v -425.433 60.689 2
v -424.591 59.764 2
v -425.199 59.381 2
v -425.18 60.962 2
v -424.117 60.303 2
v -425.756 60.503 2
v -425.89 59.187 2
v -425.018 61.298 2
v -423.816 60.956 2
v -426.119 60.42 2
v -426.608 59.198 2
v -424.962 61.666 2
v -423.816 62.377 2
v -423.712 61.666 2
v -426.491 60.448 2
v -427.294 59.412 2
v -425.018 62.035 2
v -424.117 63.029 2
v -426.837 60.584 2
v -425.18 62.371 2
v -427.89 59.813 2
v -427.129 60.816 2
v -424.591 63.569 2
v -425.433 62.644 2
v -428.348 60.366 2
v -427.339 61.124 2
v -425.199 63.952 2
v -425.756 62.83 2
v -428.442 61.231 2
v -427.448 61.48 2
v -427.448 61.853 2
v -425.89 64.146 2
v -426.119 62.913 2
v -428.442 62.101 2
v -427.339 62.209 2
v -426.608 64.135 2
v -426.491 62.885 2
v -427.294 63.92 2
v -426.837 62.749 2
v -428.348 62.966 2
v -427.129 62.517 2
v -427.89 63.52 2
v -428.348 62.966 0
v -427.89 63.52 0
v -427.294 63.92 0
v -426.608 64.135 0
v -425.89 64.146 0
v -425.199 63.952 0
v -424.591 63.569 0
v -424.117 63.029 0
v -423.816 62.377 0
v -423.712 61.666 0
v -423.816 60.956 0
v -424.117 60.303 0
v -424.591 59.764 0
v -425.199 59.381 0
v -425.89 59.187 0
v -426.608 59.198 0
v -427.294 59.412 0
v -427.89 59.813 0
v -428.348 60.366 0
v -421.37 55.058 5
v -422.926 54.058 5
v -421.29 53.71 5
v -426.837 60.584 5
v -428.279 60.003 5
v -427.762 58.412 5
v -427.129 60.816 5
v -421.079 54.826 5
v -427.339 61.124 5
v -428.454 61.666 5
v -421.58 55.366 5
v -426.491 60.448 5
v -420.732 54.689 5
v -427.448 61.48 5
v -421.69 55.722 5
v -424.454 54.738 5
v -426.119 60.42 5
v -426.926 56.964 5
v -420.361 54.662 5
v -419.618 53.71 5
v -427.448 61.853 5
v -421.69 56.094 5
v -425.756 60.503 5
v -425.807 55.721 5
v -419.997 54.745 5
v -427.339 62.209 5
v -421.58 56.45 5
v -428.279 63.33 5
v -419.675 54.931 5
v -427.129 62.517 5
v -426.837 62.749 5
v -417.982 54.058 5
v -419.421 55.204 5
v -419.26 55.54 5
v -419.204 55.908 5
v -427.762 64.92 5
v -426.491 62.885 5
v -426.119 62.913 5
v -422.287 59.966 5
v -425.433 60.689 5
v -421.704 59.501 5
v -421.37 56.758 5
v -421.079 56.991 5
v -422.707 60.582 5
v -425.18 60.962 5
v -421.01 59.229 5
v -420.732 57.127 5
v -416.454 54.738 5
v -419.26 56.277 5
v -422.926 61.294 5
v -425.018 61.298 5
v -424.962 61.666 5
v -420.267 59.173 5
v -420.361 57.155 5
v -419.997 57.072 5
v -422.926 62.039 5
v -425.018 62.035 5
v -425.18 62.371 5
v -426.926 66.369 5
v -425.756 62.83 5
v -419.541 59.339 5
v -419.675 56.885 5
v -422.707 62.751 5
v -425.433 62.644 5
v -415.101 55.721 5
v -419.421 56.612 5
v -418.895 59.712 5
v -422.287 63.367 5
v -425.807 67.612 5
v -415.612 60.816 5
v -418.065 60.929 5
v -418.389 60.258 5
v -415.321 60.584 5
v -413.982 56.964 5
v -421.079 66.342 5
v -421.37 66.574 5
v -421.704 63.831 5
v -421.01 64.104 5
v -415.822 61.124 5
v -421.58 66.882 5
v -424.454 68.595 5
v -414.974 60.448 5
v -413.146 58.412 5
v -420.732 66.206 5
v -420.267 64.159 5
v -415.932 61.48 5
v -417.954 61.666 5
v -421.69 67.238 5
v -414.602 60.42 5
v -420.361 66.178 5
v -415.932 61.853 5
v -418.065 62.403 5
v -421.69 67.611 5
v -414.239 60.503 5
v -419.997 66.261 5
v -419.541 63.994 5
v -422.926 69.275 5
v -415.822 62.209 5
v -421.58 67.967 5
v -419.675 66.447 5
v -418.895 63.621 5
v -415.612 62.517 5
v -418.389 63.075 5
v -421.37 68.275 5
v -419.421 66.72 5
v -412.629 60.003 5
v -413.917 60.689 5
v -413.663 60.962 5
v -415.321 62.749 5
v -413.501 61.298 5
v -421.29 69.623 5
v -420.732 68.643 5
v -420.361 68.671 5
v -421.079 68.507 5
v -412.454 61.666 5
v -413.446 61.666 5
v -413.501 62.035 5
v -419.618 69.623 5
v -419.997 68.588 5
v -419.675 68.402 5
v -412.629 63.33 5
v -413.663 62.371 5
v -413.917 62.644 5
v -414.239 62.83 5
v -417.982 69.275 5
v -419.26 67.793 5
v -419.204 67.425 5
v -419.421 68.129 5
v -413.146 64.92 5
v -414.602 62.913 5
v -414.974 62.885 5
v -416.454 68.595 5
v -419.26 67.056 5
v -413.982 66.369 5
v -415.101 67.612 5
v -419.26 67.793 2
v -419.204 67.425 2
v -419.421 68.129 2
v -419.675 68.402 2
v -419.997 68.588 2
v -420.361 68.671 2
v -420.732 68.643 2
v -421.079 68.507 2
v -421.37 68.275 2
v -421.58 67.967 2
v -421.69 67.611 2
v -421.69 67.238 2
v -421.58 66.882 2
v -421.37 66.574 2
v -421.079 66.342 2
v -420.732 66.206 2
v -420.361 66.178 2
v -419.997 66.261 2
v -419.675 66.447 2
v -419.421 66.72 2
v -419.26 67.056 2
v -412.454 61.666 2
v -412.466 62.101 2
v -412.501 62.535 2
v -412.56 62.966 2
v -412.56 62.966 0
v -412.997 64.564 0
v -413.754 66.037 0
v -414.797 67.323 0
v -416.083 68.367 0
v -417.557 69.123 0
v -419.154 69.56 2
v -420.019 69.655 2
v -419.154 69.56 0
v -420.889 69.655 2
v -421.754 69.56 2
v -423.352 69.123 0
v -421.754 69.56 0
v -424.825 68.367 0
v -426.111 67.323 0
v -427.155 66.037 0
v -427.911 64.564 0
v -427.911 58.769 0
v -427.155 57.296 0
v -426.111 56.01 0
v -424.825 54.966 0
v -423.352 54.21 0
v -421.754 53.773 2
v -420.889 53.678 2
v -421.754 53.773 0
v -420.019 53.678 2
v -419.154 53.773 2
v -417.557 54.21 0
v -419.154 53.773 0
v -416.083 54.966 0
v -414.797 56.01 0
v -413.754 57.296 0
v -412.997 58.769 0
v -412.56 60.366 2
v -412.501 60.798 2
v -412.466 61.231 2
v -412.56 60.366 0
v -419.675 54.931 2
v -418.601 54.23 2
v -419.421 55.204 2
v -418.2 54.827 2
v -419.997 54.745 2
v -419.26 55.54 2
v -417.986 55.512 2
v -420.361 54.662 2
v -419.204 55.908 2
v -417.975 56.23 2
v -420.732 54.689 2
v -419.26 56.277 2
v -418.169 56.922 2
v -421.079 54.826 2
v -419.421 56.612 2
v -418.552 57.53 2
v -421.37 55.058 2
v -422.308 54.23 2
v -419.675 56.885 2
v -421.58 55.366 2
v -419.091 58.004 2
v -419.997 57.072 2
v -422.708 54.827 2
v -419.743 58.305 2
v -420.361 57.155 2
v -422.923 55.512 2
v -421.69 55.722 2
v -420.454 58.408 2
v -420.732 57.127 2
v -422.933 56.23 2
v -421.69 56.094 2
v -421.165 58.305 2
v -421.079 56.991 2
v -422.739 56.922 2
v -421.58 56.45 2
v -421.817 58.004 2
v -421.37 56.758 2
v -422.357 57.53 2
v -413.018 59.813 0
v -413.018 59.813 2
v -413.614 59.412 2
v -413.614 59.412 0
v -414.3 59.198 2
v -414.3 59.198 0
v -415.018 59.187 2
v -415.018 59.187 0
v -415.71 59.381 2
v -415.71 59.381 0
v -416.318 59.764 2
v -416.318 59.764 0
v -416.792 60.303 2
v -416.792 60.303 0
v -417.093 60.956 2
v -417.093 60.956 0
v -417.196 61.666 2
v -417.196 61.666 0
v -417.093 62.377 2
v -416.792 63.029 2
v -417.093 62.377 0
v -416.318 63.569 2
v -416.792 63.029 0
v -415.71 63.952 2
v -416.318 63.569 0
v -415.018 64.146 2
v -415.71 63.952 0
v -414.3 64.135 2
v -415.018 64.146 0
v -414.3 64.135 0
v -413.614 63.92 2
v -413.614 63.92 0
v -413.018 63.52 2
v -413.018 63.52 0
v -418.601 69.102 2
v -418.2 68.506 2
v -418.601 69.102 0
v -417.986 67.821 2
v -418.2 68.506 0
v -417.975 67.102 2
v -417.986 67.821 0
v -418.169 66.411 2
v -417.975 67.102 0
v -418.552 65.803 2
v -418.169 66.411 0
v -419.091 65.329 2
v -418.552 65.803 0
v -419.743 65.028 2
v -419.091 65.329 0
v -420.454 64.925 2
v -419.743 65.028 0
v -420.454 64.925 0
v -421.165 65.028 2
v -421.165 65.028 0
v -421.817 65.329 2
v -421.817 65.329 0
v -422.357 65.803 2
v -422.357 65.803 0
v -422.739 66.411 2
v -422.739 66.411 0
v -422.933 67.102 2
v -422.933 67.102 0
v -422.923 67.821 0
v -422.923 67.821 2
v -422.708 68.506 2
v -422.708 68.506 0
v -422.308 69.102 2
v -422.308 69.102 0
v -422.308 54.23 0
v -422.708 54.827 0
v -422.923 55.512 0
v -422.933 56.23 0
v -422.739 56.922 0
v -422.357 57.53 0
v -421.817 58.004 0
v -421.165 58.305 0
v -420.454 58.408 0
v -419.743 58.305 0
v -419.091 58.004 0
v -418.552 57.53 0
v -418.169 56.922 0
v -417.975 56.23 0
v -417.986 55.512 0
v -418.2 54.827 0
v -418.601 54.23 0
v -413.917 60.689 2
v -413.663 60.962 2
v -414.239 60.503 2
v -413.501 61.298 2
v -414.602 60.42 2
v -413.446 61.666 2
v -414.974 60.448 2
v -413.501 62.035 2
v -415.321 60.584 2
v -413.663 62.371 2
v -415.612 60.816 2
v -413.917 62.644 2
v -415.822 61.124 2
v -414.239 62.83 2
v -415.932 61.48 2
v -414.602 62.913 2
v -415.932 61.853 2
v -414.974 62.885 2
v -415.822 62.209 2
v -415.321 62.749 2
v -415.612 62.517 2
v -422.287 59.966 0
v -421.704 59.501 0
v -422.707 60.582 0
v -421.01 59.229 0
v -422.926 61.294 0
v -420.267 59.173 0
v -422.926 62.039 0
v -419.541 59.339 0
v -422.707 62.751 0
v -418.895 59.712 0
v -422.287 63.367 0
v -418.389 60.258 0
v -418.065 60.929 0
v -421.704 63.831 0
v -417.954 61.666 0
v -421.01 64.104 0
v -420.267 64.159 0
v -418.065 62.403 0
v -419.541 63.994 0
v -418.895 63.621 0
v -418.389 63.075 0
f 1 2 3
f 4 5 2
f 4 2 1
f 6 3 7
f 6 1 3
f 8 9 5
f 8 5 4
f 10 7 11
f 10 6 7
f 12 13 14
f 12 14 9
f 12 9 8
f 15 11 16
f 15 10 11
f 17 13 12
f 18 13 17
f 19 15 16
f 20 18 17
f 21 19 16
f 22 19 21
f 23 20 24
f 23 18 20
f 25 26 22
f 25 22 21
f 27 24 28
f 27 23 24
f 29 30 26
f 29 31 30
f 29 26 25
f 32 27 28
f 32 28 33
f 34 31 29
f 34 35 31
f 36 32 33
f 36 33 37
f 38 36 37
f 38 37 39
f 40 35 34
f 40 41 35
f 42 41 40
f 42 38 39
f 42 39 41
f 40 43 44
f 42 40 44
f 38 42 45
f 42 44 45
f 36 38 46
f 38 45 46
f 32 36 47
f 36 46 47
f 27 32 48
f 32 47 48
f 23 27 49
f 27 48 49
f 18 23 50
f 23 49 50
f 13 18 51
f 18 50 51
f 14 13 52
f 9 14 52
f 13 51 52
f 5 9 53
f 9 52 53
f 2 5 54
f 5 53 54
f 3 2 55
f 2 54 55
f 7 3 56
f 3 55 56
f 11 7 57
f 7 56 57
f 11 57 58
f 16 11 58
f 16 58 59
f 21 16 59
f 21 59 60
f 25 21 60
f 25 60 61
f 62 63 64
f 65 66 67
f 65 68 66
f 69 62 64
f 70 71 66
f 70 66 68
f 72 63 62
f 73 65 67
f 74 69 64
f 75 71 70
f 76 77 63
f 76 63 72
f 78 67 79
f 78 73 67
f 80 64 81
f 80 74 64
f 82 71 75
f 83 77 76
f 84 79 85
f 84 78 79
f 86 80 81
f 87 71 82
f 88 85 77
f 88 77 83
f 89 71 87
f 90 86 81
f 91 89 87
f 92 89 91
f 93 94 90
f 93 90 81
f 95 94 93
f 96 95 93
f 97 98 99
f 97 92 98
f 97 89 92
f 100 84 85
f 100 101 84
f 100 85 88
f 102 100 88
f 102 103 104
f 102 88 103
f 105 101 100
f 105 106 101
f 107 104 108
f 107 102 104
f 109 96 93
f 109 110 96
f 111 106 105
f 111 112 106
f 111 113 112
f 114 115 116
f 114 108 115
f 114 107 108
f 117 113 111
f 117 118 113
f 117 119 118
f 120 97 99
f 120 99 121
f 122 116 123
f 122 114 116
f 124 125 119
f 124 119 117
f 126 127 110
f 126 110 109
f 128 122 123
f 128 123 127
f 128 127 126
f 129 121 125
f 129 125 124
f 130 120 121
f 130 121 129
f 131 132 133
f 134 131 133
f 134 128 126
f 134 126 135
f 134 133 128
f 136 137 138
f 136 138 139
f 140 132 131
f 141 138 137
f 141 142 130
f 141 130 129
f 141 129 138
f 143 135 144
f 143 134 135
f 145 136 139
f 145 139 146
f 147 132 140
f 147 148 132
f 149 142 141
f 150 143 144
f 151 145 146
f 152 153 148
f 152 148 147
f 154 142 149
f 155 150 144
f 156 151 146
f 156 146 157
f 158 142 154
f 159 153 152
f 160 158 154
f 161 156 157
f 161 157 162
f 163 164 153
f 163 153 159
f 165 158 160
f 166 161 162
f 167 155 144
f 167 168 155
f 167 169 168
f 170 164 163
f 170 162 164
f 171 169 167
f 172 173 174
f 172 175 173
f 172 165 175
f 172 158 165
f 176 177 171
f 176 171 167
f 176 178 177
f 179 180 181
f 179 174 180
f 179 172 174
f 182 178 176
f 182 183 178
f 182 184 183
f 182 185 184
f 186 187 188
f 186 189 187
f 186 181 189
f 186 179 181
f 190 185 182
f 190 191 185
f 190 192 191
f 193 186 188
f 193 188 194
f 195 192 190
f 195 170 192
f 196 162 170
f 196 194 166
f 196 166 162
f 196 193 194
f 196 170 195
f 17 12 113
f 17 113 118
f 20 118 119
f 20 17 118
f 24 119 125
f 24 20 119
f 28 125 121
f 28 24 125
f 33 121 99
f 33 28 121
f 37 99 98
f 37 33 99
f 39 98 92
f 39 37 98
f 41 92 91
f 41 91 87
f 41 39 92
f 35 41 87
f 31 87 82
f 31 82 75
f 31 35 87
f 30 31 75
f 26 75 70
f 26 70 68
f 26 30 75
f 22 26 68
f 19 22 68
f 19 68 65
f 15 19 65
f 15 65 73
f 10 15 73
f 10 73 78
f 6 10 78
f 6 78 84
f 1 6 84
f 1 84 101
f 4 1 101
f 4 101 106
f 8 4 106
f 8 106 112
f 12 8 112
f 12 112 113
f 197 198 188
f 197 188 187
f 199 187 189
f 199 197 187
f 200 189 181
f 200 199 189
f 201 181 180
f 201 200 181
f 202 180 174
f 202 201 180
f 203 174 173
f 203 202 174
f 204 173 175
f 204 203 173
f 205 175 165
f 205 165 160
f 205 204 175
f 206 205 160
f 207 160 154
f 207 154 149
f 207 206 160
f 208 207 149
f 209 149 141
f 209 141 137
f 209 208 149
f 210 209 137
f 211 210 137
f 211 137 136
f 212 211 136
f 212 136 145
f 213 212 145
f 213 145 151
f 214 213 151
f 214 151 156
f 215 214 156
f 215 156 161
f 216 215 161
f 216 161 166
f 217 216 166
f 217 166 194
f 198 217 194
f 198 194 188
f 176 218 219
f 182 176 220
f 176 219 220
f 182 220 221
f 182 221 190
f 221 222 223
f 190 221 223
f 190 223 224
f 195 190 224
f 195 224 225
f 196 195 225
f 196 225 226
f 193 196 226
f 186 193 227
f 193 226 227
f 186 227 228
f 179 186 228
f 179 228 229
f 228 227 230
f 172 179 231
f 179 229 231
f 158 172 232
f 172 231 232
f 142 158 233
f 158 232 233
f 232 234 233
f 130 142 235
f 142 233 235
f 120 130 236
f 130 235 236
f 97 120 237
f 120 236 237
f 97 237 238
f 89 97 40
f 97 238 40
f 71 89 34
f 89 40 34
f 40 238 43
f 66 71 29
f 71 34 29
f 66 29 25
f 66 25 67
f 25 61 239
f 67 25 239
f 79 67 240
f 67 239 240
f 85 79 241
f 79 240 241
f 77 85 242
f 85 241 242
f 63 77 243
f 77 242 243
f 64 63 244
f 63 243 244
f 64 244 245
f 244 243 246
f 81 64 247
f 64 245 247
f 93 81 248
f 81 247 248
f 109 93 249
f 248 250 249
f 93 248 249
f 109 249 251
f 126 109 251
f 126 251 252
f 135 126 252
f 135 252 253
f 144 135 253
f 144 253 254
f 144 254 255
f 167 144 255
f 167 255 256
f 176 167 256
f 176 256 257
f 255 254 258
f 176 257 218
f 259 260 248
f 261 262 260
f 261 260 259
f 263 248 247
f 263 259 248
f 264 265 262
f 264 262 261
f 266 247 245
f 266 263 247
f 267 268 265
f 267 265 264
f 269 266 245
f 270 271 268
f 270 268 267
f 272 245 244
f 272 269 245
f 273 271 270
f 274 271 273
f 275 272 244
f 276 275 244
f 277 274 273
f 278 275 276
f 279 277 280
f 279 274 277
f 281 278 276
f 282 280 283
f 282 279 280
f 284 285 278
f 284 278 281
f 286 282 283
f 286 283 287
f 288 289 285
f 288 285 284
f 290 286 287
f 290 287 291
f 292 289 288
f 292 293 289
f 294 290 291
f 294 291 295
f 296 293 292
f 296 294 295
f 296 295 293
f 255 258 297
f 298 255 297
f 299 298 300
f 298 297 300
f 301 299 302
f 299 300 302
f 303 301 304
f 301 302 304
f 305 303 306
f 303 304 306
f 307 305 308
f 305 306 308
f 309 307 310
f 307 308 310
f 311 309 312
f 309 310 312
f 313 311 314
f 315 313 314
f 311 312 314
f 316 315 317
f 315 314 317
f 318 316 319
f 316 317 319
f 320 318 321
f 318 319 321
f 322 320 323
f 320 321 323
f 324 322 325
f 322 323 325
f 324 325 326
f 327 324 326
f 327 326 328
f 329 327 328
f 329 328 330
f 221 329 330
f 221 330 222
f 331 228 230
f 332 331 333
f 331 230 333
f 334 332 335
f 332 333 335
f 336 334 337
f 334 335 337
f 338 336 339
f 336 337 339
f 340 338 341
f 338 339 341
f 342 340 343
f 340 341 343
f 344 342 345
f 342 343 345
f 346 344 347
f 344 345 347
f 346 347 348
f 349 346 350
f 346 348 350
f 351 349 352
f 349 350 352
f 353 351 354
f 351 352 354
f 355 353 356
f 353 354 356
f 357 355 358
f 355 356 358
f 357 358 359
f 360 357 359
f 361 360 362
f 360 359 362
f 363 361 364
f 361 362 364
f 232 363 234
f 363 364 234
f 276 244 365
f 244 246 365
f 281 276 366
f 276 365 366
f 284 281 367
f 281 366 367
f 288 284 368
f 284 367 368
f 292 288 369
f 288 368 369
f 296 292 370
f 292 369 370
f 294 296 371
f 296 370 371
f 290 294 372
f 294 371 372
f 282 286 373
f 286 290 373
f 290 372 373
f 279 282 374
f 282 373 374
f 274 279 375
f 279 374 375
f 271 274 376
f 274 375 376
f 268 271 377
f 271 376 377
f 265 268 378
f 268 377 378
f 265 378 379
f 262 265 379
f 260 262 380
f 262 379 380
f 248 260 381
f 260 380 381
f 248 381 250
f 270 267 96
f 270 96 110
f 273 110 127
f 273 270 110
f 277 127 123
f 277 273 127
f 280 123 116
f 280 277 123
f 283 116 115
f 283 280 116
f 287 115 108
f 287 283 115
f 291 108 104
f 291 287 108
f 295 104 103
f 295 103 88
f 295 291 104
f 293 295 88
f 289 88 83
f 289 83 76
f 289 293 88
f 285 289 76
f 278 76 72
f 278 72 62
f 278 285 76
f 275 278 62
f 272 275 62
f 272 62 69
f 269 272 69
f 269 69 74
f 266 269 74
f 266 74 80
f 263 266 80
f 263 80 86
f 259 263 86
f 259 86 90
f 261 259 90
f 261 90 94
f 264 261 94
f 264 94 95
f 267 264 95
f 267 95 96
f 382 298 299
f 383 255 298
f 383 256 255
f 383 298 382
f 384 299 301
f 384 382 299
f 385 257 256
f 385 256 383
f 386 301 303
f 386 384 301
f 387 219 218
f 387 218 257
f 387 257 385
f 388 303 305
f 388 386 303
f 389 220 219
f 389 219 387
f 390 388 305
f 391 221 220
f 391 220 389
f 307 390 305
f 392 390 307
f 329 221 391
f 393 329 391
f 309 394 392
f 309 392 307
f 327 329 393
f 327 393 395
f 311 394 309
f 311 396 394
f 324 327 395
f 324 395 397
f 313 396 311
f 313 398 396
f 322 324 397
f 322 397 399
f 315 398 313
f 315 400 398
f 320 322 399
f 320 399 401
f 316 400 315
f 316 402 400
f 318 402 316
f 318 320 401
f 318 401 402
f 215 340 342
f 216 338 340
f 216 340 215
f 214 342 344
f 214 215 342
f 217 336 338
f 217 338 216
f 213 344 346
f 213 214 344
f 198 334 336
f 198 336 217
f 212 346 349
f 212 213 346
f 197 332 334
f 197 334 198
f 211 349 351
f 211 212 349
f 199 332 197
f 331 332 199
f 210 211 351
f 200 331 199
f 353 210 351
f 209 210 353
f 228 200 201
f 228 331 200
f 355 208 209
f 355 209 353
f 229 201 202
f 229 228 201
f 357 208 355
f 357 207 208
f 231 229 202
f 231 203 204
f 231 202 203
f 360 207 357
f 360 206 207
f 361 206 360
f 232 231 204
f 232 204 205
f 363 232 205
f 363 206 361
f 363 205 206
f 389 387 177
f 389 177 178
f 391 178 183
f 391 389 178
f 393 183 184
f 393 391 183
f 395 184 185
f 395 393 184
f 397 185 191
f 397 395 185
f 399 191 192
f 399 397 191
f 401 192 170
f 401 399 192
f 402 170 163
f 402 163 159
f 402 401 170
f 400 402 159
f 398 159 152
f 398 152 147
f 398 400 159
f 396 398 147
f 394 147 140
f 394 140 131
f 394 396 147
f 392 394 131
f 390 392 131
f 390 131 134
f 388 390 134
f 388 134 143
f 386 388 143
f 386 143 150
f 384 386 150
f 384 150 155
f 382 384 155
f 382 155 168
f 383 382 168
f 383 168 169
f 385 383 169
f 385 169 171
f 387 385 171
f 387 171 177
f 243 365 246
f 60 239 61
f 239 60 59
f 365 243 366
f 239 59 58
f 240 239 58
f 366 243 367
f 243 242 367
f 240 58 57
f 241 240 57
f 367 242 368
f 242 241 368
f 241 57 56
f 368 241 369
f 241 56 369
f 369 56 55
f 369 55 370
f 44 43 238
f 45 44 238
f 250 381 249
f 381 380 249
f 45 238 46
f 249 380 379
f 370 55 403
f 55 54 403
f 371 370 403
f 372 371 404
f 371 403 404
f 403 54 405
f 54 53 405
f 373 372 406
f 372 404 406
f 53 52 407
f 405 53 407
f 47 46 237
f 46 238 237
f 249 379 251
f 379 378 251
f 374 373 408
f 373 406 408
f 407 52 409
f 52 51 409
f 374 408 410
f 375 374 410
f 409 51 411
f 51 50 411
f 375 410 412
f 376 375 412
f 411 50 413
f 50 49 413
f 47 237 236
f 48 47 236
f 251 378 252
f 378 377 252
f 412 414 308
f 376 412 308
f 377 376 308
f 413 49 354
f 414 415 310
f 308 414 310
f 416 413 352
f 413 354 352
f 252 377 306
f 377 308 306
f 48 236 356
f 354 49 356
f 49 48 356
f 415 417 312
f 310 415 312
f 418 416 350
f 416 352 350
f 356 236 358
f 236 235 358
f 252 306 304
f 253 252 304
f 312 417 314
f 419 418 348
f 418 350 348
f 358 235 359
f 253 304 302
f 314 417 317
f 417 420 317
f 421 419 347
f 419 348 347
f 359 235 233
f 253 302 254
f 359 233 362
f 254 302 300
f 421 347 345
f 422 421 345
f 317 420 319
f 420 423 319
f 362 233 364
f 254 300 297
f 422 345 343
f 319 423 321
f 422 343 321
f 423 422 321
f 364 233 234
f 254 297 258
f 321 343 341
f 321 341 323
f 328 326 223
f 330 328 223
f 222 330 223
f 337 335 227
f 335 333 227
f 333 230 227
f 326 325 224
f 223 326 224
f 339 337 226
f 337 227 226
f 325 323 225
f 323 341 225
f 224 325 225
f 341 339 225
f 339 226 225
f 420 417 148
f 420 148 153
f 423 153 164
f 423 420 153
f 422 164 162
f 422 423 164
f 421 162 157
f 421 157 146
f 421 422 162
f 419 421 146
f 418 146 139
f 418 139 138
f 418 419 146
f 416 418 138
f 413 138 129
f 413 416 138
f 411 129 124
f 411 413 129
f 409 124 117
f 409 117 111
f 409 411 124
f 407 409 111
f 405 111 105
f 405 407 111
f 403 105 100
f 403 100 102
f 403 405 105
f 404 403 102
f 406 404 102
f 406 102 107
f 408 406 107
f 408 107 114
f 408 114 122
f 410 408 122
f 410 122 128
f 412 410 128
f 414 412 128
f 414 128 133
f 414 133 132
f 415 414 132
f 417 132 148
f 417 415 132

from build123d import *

# Parameters (mm, degrees)
SKETCH_1_R          = 8
SKETCH_1_R_2        = 2.5
SKETCH_1_R_3        = 1.25
EXTRUDE_1_DEPTH     = 5
SKETCH_2_R          = 2.5
CUT_EXTRUDE_1_DEPTH = 2


with BuildPart() as part:
    # 草图1 → 凸台-拉伸1 (new body)
    with BuildSketch(Plane.XY):
        with Locations((-420.454135706, 61.666363326)):
            Circle(SKETCH_1_R)
        with Locations((-420.454135706, 61.666363326)):
            Circle(SKETCH_1_R_2, mode=Mode.SUBTRACT)
        with Locations((-420.454135706, 67.424629947)):
            Circle(SKETCH_1_R_3, mode=Mode.SUBTRACT)
        with Locations((-414.695869085, 61.666363326)):
            Circle(SKETCH_1_R_3, mode=Mode.SUBTRACT)
        with Locations((-420.454135706, 55.908096705)):
            Circle(SKETCH_1_R_3, mode=Mode.SUBTRACT)
        with Locations((-426.212402327, 61.666363326)):
            Circle(SKETCH_1_R_3, mode=Mode.SUBTRACT)
    extrude(amount=EXTRUDE_1_DEPTH)

    # 草图2 → 切除-拉伸1 (cut)
    with BuildSketch(Plane(origin=(0, 0, 0), x_dir=(-1, 0, 0), z_dir=(0, 0, -1))):
        with Locations((420.454135706, 67.424629947)):
            Circle(SKETCH_2_R)
        with Locations((426.212402327, 61.666363326)):
            Circle(SKETCH_2_R)
        with Locations((420.454135706, 55.908096705)):
            Circle(SKETCH_2_R)
        with Locations((414.695869085, 61.666363326)):
            Circle(SKETCH_2_R)
    extrude(amount=-CUT_EXTRUDE_1_DEPTH, mode=Mode.SUBTRACT)


solid = part.part
